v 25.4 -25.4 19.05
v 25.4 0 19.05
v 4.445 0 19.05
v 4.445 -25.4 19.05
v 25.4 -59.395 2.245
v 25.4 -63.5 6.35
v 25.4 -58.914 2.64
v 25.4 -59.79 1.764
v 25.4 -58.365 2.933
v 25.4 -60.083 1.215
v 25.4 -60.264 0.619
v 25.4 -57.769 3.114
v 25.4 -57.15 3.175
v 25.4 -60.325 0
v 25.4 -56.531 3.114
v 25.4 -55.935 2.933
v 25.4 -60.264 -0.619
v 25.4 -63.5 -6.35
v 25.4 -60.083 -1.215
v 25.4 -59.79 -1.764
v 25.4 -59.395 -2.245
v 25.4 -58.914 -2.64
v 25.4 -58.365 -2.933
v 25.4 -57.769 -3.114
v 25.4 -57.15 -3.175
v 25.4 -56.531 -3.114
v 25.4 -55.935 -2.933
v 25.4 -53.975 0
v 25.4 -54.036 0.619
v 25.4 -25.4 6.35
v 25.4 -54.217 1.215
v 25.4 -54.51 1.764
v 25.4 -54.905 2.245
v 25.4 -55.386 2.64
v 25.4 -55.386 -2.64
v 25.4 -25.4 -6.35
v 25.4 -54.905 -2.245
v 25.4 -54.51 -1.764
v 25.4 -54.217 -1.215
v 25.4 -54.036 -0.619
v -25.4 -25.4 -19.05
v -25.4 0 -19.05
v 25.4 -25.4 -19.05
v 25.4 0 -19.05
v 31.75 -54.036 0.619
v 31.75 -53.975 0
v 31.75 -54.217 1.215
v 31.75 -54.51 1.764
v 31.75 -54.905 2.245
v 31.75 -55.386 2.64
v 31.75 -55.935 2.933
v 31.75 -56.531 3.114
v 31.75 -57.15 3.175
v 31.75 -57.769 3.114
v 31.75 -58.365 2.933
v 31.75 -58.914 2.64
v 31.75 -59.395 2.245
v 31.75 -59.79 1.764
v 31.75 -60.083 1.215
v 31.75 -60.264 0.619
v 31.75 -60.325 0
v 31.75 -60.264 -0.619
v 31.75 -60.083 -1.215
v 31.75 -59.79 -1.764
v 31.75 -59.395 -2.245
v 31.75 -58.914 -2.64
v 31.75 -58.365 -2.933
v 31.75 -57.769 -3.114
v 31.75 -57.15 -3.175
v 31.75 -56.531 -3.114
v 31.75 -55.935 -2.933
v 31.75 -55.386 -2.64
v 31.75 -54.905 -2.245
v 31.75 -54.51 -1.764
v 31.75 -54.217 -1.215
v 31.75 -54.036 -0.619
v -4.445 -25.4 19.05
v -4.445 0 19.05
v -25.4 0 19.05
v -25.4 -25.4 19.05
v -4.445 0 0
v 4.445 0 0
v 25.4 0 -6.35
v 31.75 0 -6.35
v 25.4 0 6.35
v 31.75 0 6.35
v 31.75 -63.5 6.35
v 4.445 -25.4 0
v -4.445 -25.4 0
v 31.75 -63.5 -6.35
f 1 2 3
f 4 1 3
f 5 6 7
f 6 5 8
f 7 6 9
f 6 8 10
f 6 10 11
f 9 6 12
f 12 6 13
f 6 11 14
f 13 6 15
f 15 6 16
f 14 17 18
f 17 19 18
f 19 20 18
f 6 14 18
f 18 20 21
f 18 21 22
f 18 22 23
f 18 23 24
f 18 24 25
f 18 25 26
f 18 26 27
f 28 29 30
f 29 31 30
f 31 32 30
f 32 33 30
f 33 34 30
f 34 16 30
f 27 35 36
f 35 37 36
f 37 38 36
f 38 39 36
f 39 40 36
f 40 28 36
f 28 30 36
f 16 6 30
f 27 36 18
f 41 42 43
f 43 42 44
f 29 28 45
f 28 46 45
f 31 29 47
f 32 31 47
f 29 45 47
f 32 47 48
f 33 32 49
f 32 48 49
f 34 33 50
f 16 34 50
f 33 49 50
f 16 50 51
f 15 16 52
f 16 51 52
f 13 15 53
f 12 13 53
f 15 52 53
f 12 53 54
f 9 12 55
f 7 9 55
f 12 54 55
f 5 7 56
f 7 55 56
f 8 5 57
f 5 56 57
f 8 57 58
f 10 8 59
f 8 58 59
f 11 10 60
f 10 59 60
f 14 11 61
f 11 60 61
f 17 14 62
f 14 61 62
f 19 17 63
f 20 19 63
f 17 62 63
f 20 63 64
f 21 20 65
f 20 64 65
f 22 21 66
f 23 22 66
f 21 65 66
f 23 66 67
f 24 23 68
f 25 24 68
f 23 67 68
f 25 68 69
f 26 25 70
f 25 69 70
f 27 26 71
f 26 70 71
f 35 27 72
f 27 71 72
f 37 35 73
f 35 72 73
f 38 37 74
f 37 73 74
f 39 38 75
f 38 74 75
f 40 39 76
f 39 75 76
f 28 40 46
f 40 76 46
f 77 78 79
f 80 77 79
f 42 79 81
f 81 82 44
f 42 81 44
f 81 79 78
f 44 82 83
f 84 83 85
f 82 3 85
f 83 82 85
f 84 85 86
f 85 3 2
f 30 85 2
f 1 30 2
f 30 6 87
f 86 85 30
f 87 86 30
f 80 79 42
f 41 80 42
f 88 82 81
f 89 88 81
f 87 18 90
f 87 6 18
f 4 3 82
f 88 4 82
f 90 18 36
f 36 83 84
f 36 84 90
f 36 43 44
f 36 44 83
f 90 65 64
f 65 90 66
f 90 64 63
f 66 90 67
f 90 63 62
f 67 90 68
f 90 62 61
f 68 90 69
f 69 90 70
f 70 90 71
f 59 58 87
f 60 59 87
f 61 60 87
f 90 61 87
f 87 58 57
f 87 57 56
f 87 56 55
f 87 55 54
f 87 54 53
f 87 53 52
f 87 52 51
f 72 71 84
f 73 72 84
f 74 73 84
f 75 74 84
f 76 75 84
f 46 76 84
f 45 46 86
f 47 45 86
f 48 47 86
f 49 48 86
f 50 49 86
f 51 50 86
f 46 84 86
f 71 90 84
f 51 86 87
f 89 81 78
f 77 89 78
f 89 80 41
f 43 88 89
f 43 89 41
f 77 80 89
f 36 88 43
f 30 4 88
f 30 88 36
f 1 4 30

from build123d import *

# Parameters (mm, degrees)
F1_DEPTH = 25.4
F2_W     = 6.35
F2_H     = 6.35
F3_DEPTH = 63.5
F4_R     = 3.175
F5_DEPTH = 63.5


with BuildPart() as f1:
    # F0 (on Front) → F1 (new body)
    with BuildSketch(Plane.XZ):
        Polygon((-4.445, 19.05), (-25.4, 19.05), (-25.4, -19.05), (25.4, -19.05), (25.4, 19.05), (4.445, 19.05), (4.445, 0), (0, 0), (-4.445, 0), align=None)
    extrude(amount=F1_DEPTH)

    # F2 (on Front) → F3 (join)
    with BuildSketch(Plane.XZ):
        with Locations((28.575, -3.175)):
            Rectangle(F2_W, F2_H)
        with Locations((28.575, 3.175)):
            Rectangle(F2_W, F2_H)
    extrude(amount=F3_DEPTH)

    # F4 (on Right) → F5 (cut, symmetric)
    with BuildSketch(Plane.YZ):
        with Locations((-57.15, 0)):
            Circle(F4_R)
    extrude(amount=F5_DEPTH, both=True, mode=Mode.SUBTRACT)


solid = f1.part
